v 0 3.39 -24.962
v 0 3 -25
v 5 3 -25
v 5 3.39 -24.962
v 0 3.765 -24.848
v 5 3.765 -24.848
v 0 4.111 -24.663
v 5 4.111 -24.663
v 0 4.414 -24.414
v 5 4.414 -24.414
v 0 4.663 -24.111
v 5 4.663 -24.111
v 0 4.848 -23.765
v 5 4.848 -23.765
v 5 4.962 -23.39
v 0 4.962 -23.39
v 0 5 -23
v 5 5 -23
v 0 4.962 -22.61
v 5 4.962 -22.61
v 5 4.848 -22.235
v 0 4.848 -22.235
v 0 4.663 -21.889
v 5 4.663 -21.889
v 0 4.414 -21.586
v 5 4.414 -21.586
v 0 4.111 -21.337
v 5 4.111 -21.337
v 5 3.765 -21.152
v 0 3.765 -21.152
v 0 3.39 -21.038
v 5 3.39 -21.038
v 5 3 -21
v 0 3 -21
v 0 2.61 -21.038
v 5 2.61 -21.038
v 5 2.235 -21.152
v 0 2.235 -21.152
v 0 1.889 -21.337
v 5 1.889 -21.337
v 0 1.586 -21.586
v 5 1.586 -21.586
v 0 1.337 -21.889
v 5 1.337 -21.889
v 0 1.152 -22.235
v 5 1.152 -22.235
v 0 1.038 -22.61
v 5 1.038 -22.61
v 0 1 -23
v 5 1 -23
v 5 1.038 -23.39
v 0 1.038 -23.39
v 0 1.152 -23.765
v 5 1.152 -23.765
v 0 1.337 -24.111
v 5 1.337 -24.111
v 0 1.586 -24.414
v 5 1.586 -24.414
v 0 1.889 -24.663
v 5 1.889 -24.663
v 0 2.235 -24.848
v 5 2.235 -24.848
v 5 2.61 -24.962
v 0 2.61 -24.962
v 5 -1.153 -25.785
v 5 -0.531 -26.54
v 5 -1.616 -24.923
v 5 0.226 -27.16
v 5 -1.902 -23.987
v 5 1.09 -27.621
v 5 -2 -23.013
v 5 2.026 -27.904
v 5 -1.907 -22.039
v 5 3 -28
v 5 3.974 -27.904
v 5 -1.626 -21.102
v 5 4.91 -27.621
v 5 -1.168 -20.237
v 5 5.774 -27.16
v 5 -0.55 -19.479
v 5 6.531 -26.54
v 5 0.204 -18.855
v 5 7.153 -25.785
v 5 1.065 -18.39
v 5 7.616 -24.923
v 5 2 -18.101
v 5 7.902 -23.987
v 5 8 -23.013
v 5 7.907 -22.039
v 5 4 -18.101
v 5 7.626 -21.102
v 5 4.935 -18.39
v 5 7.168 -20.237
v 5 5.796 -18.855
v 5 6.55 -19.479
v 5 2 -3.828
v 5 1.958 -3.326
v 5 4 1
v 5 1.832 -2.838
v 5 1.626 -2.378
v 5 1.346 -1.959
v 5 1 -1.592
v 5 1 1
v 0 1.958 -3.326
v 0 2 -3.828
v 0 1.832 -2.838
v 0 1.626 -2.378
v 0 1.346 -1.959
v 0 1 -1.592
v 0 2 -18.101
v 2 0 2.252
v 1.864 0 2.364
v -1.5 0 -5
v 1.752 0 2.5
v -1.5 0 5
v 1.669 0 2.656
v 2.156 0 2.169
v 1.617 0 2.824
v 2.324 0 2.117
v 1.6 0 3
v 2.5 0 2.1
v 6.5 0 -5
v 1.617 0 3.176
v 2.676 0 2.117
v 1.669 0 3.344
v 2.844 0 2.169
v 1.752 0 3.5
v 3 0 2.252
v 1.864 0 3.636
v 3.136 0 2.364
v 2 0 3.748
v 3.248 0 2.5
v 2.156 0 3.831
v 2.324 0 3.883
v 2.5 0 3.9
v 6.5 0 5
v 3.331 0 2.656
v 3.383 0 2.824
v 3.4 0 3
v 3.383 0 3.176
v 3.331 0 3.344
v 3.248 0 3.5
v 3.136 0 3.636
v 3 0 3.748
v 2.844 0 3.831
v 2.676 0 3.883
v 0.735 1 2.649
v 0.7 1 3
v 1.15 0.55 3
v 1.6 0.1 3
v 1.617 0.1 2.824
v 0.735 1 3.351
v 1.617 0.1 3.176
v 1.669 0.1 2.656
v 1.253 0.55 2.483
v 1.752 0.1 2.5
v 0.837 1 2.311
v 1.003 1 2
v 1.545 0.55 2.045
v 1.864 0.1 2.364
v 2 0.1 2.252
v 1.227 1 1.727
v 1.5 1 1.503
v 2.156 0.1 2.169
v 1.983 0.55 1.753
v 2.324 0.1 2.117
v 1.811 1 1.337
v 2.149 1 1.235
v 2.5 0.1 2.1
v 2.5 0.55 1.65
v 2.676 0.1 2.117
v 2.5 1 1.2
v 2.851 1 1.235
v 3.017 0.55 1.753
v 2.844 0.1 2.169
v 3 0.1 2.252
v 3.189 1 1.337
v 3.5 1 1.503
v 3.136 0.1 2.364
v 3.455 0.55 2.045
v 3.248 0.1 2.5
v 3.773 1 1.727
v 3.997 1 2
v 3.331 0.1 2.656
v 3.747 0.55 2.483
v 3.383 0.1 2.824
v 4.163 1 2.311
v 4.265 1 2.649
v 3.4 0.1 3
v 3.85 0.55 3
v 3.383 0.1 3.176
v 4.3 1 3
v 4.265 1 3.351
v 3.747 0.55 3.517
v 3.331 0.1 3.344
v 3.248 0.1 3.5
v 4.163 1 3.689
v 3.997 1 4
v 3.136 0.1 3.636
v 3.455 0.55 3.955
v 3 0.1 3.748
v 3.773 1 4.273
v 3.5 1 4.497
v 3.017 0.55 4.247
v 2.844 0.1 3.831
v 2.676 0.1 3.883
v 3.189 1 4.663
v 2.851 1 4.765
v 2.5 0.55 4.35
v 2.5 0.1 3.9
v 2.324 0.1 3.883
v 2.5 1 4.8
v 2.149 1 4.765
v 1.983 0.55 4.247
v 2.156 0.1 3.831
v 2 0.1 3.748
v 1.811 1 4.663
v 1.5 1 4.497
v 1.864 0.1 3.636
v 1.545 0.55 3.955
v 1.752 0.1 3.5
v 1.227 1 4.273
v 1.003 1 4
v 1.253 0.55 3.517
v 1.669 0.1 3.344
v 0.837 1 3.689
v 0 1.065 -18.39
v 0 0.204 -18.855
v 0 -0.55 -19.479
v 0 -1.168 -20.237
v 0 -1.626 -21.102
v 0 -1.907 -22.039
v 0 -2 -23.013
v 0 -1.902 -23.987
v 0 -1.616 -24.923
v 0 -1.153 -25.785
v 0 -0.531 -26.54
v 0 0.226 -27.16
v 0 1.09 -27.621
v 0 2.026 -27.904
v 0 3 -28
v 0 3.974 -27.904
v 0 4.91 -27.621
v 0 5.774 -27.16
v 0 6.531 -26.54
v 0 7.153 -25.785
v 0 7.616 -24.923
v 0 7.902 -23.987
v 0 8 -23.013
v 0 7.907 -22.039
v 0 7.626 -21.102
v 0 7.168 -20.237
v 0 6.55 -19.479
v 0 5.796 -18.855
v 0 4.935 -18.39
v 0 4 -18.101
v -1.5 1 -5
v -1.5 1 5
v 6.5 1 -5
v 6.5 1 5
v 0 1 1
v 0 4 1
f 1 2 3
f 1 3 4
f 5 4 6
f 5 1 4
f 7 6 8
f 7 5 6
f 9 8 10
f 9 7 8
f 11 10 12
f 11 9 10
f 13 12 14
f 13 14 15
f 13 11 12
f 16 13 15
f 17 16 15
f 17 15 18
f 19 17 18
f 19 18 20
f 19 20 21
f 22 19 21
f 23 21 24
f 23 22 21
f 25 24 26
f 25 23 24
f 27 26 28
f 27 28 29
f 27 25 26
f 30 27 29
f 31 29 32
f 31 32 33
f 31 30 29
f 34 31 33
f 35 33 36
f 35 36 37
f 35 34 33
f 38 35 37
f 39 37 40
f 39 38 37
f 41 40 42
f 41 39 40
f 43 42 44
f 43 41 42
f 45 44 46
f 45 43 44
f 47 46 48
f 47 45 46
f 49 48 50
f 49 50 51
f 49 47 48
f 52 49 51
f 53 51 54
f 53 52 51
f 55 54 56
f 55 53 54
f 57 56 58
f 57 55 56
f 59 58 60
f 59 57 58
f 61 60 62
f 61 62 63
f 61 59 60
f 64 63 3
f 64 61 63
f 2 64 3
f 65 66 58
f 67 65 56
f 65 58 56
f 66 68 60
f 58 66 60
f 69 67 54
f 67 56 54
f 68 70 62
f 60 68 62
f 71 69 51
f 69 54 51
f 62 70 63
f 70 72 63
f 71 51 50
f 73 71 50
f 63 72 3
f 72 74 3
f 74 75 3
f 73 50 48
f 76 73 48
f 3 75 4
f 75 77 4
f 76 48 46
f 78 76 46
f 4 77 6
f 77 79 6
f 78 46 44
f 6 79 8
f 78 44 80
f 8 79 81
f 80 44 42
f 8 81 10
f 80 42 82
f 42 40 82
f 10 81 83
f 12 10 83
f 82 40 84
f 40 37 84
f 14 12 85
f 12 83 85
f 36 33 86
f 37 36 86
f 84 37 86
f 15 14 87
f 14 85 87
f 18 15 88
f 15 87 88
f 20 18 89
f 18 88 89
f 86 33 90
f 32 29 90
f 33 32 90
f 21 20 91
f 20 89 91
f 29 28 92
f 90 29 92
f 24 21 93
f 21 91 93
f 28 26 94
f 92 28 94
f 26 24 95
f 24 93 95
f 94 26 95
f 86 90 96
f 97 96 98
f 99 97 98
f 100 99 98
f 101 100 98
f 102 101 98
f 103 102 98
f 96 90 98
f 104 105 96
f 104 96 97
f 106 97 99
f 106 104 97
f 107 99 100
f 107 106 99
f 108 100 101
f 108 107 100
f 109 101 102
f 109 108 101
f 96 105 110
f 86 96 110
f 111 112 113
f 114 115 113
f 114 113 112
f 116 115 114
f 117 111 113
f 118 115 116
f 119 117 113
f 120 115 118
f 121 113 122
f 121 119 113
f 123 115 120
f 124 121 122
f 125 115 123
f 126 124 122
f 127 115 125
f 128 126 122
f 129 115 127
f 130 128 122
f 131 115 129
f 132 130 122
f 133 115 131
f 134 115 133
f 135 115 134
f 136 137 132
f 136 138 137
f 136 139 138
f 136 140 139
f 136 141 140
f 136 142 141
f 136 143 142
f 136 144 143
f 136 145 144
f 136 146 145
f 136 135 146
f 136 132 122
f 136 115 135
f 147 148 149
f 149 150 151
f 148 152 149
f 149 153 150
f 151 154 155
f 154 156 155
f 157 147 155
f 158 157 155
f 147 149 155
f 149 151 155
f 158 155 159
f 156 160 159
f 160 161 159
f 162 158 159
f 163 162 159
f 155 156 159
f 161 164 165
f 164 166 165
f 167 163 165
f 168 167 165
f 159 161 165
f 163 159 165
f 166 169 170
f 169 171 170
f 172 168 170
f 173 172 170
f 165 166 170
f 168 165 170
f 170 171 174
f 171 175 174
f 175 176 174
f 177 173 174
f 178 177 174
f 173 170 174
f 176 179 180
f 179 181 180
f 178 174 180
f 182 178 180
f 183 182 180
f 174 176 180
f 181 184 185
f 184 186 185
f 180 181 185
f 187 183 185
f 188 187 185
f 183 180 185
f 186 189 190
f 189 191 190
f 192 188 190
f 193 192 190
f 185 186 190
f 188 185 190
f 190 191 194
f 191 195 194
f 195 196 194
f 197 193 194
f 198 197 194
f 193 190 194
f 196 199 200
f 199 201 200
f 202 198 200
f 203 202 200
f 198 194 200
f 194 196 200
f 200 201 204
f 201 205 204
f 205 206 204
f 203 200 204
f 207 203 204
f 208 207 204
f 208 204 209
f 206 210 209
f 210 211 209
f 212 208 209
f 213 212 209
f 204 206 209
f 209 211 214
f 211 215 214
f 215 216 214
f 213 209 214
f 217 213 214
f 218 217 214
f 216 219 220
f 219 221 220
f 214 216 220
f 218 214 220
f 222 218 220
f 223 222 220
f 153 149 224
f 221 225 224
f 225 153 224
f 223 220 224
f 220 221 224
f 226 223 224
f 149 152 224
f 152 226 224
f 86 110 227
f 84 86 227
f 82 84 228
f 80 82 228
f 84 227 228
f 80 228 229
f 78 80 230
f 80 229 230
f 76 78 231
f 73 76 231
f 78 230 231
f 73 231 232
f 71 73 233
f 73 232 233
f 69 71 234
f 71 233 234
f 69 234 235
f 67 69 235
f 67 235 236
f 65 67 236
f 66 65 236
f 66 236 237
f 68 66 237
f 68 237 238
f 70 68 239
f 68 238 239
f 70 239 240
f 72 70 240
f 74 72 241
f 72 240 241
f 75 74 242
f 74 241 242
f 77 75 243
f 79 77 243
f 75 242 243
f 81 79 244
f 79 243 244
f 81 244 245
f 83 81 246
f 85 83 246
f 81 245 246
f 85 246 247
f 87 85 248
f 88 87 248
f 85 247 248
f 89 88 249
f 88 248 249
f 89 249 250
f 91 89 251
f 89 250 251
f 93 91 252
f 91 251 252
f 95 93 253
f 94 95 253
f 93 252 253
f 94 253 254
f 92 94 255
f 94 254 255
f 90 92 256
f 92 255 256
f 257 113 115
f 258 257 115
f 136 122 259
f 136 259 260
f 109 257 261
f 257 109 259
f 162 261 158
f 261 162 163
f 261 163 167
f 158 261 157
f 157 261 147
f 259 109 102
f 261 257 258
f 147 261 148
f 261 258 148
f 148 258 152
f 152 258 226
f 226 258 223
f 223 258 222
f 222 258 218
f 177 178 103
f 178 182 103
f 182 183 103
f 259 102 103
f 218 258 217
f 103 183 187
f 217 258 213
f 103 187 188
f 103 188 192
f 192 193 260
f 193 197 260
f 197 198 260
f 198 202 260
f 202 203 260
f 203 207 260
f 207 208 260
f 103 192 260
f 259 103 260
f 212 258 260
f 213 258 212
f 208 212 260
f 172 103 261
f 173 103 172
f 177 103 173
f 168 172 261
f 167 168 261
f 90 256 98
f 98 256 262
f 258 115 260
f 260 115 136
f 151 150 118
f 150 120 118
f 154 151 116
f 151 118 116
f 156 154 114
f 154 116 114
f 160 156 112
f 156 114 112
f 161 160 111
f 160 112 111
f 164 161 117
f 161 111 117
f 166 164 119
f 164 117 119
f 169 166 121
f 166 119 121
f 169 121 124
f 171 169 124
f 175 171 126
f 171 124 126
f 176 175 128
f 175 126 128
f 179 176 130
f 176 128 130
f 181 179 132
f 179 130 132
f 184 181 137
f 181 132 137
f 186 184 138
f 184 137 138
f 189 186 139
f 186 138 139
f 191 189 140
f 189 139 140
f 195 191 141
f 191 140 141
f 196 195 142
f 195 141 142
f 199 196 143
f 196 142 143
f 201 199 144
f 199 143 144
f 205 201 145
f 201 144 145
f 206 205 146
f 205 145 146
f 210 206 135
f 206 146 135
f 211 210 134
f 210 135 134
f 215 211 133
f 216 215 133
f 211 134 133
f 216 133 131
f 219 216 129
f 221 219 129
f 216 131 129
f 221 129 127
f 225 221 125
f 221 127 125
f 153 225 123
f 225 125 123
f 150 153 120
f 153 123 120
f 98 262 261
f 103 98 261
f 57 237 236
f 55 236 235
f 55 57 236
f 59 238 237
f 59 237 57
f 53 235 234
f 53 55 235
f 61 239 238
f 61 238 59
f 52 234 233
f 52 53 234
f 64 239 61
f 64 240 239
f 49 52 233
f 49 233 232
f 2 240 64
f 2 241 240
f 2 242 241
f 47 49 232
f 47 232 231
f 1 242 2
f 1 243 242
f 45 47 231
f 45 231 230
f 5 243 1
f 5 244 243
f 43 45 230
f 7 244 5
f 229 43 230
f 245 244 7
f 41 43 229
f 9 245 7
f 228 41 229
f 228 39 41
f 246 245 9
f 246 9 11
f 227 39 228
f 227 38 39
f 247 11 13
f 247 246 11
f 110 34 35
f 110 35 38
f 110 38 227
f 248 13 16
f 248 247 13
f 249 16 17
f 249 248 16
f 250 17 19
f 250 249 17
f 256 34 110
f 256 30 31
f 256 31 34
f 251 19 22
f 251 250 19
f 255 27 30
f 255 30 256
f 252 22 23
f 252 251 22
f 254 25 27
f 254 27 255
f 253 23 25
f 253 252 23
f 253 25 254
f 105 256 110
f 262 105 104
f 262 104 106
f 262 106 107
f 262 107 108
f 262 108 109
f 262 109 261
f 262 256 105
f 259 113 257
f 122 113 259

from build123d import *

# Parameters (mm, degrees)
SKETCH1_R                                            = 2
BOSS_EXTRUDE1_DEPTH                                  = 5
FILLET1_R                                            = 3
SKETCH2_W                                            = 8
SKETCH2_H                                            = 10
BOSS_EXTRUDE3_DEPTH                                  = 1
CSK_FOR_M1_6_COUNTERSUNK_FLAT_HEAD_SCREW_D           = 1.8
CSK_FOR_M1_6_COUNTERSUNK_FLAT_HEAD_SCREW_DEPTH       = 30
CSK_FOR_M1_6_COUNTERSUNK_FLAT_HEAD_SCREW_CSINK_D     = 3.6
CSK_FOR_M1_6_COUNTERSUNK_FLAT_HEAD_SCREW_CSINK_ANGLE = 90
CSK_FOR_M1_6_COUNTERSUNK_FLAT_HEAD_SCREW_TIP         = 0.540774557


with BuildPart() as part:
    # Sketch1 → Boss-Extrude1 (new body)
    with BuildSketch(Plane(origin=(0, 0, 0), x_dir=(0, 0, -1), z_dir=(1, 0, 0))):
        with BuildLine():
            Line((1, 2), (18.101020514, 2))
            ThreePointArc((18.101020514, 2), (28, 3), (18.101020514, 4))
            Line((18.101020514, 4), (-1, 4))
            Line((-1, 4), (-1, 0))
            Line((-1, 0), (1, 0))
            Line((1, 0), (1, 2))
        make_face()
        with Locations((23, 3)):
            Circle(SKETCH1_R, mode=Mode.SUBTRACT)
    extrude(amount=BOSS_EXTRUDE1_DEPTH)

    # Fillet1
    # the kernel refuses this fillet: 3 mm, written as the material it adds along each edge
    with BuildSketch(Plane(origin=(0, 2, -1), x_dir=(0, 0, -1), z_dir=(1, 0, 0))) as fillet1_piece_1:
        with BuildLine():
            CenterArc((2.828427125, -3), FILLET1_R, 90, 70.528779366)
            Line((0, -2), (-0.056568542, -1.98))
            ThreePointArc((-0.056568542, -1.98), (-0.06, -1), (-0.06, 0))
            Line((-0.06, 0), (0, 0.06))
            Line((0, 0.06), (2.828427125, 0.06))
            Line((2.828427125, 0.06), (2.828427125, 0))
        make_face()
    extrude(amount=5)

    # Sketch2 → Boss-Extrude3 (add)
    with BuildSketch(Plane.XZ):
        with Locations((2.5, 0)):
            Rectangle(SKETCH2_W, SKETCH2_H)
    extrude(amount=-BOSS_EXTRUDE3_DEPTH)

    # CSK for M1.6 Countersunk Flat Head Screw1
    with Locations(Plane(origin=(0, 1, 0), x_dir=(1, 0, 0), z_dir=(0, 1, 0))):
        with Locations((2.5, -3)):
            CounterSinkHole(CSK_FOR_M1_6_COUNTERSUNK_FLAT_HEAD_SCREW_D / 2, CSK_FOR_M1_6_COUNTERSUNK_FLAT_HEAD_SCREW_CSINK_D / 2, depth=CSK_FOR_M1_6_COUNTERSUNK_FLAT_HEAD_SCREW_DEPTH, counter_sink_angle=CSK_FOR_M1_6_COUNTERSUNK_FLAT_HEAD_SCREW_CSINK_ANGLE)
            with Locations((0, 0, -(CSK_FOR_M1_6_COUNTERSUNK_FLAT_HEAD_SCREW_DEPTH + CSK_FOR_M1_6_COUNTERSUNK_FLAT_HEAD_SCREW_TIP / 2))):  # 118° drill point
                Cone(0, CSK_FOR_M1_6_COUNTERSUNK_FLAT_HEAD_SCREW_D / 2, CSK_FOR_M1_6_COUNTERSUNK_FLAT_HEAD_SCREW_TIP, mode=Mode.SUBTRACT)


solid = part.part
